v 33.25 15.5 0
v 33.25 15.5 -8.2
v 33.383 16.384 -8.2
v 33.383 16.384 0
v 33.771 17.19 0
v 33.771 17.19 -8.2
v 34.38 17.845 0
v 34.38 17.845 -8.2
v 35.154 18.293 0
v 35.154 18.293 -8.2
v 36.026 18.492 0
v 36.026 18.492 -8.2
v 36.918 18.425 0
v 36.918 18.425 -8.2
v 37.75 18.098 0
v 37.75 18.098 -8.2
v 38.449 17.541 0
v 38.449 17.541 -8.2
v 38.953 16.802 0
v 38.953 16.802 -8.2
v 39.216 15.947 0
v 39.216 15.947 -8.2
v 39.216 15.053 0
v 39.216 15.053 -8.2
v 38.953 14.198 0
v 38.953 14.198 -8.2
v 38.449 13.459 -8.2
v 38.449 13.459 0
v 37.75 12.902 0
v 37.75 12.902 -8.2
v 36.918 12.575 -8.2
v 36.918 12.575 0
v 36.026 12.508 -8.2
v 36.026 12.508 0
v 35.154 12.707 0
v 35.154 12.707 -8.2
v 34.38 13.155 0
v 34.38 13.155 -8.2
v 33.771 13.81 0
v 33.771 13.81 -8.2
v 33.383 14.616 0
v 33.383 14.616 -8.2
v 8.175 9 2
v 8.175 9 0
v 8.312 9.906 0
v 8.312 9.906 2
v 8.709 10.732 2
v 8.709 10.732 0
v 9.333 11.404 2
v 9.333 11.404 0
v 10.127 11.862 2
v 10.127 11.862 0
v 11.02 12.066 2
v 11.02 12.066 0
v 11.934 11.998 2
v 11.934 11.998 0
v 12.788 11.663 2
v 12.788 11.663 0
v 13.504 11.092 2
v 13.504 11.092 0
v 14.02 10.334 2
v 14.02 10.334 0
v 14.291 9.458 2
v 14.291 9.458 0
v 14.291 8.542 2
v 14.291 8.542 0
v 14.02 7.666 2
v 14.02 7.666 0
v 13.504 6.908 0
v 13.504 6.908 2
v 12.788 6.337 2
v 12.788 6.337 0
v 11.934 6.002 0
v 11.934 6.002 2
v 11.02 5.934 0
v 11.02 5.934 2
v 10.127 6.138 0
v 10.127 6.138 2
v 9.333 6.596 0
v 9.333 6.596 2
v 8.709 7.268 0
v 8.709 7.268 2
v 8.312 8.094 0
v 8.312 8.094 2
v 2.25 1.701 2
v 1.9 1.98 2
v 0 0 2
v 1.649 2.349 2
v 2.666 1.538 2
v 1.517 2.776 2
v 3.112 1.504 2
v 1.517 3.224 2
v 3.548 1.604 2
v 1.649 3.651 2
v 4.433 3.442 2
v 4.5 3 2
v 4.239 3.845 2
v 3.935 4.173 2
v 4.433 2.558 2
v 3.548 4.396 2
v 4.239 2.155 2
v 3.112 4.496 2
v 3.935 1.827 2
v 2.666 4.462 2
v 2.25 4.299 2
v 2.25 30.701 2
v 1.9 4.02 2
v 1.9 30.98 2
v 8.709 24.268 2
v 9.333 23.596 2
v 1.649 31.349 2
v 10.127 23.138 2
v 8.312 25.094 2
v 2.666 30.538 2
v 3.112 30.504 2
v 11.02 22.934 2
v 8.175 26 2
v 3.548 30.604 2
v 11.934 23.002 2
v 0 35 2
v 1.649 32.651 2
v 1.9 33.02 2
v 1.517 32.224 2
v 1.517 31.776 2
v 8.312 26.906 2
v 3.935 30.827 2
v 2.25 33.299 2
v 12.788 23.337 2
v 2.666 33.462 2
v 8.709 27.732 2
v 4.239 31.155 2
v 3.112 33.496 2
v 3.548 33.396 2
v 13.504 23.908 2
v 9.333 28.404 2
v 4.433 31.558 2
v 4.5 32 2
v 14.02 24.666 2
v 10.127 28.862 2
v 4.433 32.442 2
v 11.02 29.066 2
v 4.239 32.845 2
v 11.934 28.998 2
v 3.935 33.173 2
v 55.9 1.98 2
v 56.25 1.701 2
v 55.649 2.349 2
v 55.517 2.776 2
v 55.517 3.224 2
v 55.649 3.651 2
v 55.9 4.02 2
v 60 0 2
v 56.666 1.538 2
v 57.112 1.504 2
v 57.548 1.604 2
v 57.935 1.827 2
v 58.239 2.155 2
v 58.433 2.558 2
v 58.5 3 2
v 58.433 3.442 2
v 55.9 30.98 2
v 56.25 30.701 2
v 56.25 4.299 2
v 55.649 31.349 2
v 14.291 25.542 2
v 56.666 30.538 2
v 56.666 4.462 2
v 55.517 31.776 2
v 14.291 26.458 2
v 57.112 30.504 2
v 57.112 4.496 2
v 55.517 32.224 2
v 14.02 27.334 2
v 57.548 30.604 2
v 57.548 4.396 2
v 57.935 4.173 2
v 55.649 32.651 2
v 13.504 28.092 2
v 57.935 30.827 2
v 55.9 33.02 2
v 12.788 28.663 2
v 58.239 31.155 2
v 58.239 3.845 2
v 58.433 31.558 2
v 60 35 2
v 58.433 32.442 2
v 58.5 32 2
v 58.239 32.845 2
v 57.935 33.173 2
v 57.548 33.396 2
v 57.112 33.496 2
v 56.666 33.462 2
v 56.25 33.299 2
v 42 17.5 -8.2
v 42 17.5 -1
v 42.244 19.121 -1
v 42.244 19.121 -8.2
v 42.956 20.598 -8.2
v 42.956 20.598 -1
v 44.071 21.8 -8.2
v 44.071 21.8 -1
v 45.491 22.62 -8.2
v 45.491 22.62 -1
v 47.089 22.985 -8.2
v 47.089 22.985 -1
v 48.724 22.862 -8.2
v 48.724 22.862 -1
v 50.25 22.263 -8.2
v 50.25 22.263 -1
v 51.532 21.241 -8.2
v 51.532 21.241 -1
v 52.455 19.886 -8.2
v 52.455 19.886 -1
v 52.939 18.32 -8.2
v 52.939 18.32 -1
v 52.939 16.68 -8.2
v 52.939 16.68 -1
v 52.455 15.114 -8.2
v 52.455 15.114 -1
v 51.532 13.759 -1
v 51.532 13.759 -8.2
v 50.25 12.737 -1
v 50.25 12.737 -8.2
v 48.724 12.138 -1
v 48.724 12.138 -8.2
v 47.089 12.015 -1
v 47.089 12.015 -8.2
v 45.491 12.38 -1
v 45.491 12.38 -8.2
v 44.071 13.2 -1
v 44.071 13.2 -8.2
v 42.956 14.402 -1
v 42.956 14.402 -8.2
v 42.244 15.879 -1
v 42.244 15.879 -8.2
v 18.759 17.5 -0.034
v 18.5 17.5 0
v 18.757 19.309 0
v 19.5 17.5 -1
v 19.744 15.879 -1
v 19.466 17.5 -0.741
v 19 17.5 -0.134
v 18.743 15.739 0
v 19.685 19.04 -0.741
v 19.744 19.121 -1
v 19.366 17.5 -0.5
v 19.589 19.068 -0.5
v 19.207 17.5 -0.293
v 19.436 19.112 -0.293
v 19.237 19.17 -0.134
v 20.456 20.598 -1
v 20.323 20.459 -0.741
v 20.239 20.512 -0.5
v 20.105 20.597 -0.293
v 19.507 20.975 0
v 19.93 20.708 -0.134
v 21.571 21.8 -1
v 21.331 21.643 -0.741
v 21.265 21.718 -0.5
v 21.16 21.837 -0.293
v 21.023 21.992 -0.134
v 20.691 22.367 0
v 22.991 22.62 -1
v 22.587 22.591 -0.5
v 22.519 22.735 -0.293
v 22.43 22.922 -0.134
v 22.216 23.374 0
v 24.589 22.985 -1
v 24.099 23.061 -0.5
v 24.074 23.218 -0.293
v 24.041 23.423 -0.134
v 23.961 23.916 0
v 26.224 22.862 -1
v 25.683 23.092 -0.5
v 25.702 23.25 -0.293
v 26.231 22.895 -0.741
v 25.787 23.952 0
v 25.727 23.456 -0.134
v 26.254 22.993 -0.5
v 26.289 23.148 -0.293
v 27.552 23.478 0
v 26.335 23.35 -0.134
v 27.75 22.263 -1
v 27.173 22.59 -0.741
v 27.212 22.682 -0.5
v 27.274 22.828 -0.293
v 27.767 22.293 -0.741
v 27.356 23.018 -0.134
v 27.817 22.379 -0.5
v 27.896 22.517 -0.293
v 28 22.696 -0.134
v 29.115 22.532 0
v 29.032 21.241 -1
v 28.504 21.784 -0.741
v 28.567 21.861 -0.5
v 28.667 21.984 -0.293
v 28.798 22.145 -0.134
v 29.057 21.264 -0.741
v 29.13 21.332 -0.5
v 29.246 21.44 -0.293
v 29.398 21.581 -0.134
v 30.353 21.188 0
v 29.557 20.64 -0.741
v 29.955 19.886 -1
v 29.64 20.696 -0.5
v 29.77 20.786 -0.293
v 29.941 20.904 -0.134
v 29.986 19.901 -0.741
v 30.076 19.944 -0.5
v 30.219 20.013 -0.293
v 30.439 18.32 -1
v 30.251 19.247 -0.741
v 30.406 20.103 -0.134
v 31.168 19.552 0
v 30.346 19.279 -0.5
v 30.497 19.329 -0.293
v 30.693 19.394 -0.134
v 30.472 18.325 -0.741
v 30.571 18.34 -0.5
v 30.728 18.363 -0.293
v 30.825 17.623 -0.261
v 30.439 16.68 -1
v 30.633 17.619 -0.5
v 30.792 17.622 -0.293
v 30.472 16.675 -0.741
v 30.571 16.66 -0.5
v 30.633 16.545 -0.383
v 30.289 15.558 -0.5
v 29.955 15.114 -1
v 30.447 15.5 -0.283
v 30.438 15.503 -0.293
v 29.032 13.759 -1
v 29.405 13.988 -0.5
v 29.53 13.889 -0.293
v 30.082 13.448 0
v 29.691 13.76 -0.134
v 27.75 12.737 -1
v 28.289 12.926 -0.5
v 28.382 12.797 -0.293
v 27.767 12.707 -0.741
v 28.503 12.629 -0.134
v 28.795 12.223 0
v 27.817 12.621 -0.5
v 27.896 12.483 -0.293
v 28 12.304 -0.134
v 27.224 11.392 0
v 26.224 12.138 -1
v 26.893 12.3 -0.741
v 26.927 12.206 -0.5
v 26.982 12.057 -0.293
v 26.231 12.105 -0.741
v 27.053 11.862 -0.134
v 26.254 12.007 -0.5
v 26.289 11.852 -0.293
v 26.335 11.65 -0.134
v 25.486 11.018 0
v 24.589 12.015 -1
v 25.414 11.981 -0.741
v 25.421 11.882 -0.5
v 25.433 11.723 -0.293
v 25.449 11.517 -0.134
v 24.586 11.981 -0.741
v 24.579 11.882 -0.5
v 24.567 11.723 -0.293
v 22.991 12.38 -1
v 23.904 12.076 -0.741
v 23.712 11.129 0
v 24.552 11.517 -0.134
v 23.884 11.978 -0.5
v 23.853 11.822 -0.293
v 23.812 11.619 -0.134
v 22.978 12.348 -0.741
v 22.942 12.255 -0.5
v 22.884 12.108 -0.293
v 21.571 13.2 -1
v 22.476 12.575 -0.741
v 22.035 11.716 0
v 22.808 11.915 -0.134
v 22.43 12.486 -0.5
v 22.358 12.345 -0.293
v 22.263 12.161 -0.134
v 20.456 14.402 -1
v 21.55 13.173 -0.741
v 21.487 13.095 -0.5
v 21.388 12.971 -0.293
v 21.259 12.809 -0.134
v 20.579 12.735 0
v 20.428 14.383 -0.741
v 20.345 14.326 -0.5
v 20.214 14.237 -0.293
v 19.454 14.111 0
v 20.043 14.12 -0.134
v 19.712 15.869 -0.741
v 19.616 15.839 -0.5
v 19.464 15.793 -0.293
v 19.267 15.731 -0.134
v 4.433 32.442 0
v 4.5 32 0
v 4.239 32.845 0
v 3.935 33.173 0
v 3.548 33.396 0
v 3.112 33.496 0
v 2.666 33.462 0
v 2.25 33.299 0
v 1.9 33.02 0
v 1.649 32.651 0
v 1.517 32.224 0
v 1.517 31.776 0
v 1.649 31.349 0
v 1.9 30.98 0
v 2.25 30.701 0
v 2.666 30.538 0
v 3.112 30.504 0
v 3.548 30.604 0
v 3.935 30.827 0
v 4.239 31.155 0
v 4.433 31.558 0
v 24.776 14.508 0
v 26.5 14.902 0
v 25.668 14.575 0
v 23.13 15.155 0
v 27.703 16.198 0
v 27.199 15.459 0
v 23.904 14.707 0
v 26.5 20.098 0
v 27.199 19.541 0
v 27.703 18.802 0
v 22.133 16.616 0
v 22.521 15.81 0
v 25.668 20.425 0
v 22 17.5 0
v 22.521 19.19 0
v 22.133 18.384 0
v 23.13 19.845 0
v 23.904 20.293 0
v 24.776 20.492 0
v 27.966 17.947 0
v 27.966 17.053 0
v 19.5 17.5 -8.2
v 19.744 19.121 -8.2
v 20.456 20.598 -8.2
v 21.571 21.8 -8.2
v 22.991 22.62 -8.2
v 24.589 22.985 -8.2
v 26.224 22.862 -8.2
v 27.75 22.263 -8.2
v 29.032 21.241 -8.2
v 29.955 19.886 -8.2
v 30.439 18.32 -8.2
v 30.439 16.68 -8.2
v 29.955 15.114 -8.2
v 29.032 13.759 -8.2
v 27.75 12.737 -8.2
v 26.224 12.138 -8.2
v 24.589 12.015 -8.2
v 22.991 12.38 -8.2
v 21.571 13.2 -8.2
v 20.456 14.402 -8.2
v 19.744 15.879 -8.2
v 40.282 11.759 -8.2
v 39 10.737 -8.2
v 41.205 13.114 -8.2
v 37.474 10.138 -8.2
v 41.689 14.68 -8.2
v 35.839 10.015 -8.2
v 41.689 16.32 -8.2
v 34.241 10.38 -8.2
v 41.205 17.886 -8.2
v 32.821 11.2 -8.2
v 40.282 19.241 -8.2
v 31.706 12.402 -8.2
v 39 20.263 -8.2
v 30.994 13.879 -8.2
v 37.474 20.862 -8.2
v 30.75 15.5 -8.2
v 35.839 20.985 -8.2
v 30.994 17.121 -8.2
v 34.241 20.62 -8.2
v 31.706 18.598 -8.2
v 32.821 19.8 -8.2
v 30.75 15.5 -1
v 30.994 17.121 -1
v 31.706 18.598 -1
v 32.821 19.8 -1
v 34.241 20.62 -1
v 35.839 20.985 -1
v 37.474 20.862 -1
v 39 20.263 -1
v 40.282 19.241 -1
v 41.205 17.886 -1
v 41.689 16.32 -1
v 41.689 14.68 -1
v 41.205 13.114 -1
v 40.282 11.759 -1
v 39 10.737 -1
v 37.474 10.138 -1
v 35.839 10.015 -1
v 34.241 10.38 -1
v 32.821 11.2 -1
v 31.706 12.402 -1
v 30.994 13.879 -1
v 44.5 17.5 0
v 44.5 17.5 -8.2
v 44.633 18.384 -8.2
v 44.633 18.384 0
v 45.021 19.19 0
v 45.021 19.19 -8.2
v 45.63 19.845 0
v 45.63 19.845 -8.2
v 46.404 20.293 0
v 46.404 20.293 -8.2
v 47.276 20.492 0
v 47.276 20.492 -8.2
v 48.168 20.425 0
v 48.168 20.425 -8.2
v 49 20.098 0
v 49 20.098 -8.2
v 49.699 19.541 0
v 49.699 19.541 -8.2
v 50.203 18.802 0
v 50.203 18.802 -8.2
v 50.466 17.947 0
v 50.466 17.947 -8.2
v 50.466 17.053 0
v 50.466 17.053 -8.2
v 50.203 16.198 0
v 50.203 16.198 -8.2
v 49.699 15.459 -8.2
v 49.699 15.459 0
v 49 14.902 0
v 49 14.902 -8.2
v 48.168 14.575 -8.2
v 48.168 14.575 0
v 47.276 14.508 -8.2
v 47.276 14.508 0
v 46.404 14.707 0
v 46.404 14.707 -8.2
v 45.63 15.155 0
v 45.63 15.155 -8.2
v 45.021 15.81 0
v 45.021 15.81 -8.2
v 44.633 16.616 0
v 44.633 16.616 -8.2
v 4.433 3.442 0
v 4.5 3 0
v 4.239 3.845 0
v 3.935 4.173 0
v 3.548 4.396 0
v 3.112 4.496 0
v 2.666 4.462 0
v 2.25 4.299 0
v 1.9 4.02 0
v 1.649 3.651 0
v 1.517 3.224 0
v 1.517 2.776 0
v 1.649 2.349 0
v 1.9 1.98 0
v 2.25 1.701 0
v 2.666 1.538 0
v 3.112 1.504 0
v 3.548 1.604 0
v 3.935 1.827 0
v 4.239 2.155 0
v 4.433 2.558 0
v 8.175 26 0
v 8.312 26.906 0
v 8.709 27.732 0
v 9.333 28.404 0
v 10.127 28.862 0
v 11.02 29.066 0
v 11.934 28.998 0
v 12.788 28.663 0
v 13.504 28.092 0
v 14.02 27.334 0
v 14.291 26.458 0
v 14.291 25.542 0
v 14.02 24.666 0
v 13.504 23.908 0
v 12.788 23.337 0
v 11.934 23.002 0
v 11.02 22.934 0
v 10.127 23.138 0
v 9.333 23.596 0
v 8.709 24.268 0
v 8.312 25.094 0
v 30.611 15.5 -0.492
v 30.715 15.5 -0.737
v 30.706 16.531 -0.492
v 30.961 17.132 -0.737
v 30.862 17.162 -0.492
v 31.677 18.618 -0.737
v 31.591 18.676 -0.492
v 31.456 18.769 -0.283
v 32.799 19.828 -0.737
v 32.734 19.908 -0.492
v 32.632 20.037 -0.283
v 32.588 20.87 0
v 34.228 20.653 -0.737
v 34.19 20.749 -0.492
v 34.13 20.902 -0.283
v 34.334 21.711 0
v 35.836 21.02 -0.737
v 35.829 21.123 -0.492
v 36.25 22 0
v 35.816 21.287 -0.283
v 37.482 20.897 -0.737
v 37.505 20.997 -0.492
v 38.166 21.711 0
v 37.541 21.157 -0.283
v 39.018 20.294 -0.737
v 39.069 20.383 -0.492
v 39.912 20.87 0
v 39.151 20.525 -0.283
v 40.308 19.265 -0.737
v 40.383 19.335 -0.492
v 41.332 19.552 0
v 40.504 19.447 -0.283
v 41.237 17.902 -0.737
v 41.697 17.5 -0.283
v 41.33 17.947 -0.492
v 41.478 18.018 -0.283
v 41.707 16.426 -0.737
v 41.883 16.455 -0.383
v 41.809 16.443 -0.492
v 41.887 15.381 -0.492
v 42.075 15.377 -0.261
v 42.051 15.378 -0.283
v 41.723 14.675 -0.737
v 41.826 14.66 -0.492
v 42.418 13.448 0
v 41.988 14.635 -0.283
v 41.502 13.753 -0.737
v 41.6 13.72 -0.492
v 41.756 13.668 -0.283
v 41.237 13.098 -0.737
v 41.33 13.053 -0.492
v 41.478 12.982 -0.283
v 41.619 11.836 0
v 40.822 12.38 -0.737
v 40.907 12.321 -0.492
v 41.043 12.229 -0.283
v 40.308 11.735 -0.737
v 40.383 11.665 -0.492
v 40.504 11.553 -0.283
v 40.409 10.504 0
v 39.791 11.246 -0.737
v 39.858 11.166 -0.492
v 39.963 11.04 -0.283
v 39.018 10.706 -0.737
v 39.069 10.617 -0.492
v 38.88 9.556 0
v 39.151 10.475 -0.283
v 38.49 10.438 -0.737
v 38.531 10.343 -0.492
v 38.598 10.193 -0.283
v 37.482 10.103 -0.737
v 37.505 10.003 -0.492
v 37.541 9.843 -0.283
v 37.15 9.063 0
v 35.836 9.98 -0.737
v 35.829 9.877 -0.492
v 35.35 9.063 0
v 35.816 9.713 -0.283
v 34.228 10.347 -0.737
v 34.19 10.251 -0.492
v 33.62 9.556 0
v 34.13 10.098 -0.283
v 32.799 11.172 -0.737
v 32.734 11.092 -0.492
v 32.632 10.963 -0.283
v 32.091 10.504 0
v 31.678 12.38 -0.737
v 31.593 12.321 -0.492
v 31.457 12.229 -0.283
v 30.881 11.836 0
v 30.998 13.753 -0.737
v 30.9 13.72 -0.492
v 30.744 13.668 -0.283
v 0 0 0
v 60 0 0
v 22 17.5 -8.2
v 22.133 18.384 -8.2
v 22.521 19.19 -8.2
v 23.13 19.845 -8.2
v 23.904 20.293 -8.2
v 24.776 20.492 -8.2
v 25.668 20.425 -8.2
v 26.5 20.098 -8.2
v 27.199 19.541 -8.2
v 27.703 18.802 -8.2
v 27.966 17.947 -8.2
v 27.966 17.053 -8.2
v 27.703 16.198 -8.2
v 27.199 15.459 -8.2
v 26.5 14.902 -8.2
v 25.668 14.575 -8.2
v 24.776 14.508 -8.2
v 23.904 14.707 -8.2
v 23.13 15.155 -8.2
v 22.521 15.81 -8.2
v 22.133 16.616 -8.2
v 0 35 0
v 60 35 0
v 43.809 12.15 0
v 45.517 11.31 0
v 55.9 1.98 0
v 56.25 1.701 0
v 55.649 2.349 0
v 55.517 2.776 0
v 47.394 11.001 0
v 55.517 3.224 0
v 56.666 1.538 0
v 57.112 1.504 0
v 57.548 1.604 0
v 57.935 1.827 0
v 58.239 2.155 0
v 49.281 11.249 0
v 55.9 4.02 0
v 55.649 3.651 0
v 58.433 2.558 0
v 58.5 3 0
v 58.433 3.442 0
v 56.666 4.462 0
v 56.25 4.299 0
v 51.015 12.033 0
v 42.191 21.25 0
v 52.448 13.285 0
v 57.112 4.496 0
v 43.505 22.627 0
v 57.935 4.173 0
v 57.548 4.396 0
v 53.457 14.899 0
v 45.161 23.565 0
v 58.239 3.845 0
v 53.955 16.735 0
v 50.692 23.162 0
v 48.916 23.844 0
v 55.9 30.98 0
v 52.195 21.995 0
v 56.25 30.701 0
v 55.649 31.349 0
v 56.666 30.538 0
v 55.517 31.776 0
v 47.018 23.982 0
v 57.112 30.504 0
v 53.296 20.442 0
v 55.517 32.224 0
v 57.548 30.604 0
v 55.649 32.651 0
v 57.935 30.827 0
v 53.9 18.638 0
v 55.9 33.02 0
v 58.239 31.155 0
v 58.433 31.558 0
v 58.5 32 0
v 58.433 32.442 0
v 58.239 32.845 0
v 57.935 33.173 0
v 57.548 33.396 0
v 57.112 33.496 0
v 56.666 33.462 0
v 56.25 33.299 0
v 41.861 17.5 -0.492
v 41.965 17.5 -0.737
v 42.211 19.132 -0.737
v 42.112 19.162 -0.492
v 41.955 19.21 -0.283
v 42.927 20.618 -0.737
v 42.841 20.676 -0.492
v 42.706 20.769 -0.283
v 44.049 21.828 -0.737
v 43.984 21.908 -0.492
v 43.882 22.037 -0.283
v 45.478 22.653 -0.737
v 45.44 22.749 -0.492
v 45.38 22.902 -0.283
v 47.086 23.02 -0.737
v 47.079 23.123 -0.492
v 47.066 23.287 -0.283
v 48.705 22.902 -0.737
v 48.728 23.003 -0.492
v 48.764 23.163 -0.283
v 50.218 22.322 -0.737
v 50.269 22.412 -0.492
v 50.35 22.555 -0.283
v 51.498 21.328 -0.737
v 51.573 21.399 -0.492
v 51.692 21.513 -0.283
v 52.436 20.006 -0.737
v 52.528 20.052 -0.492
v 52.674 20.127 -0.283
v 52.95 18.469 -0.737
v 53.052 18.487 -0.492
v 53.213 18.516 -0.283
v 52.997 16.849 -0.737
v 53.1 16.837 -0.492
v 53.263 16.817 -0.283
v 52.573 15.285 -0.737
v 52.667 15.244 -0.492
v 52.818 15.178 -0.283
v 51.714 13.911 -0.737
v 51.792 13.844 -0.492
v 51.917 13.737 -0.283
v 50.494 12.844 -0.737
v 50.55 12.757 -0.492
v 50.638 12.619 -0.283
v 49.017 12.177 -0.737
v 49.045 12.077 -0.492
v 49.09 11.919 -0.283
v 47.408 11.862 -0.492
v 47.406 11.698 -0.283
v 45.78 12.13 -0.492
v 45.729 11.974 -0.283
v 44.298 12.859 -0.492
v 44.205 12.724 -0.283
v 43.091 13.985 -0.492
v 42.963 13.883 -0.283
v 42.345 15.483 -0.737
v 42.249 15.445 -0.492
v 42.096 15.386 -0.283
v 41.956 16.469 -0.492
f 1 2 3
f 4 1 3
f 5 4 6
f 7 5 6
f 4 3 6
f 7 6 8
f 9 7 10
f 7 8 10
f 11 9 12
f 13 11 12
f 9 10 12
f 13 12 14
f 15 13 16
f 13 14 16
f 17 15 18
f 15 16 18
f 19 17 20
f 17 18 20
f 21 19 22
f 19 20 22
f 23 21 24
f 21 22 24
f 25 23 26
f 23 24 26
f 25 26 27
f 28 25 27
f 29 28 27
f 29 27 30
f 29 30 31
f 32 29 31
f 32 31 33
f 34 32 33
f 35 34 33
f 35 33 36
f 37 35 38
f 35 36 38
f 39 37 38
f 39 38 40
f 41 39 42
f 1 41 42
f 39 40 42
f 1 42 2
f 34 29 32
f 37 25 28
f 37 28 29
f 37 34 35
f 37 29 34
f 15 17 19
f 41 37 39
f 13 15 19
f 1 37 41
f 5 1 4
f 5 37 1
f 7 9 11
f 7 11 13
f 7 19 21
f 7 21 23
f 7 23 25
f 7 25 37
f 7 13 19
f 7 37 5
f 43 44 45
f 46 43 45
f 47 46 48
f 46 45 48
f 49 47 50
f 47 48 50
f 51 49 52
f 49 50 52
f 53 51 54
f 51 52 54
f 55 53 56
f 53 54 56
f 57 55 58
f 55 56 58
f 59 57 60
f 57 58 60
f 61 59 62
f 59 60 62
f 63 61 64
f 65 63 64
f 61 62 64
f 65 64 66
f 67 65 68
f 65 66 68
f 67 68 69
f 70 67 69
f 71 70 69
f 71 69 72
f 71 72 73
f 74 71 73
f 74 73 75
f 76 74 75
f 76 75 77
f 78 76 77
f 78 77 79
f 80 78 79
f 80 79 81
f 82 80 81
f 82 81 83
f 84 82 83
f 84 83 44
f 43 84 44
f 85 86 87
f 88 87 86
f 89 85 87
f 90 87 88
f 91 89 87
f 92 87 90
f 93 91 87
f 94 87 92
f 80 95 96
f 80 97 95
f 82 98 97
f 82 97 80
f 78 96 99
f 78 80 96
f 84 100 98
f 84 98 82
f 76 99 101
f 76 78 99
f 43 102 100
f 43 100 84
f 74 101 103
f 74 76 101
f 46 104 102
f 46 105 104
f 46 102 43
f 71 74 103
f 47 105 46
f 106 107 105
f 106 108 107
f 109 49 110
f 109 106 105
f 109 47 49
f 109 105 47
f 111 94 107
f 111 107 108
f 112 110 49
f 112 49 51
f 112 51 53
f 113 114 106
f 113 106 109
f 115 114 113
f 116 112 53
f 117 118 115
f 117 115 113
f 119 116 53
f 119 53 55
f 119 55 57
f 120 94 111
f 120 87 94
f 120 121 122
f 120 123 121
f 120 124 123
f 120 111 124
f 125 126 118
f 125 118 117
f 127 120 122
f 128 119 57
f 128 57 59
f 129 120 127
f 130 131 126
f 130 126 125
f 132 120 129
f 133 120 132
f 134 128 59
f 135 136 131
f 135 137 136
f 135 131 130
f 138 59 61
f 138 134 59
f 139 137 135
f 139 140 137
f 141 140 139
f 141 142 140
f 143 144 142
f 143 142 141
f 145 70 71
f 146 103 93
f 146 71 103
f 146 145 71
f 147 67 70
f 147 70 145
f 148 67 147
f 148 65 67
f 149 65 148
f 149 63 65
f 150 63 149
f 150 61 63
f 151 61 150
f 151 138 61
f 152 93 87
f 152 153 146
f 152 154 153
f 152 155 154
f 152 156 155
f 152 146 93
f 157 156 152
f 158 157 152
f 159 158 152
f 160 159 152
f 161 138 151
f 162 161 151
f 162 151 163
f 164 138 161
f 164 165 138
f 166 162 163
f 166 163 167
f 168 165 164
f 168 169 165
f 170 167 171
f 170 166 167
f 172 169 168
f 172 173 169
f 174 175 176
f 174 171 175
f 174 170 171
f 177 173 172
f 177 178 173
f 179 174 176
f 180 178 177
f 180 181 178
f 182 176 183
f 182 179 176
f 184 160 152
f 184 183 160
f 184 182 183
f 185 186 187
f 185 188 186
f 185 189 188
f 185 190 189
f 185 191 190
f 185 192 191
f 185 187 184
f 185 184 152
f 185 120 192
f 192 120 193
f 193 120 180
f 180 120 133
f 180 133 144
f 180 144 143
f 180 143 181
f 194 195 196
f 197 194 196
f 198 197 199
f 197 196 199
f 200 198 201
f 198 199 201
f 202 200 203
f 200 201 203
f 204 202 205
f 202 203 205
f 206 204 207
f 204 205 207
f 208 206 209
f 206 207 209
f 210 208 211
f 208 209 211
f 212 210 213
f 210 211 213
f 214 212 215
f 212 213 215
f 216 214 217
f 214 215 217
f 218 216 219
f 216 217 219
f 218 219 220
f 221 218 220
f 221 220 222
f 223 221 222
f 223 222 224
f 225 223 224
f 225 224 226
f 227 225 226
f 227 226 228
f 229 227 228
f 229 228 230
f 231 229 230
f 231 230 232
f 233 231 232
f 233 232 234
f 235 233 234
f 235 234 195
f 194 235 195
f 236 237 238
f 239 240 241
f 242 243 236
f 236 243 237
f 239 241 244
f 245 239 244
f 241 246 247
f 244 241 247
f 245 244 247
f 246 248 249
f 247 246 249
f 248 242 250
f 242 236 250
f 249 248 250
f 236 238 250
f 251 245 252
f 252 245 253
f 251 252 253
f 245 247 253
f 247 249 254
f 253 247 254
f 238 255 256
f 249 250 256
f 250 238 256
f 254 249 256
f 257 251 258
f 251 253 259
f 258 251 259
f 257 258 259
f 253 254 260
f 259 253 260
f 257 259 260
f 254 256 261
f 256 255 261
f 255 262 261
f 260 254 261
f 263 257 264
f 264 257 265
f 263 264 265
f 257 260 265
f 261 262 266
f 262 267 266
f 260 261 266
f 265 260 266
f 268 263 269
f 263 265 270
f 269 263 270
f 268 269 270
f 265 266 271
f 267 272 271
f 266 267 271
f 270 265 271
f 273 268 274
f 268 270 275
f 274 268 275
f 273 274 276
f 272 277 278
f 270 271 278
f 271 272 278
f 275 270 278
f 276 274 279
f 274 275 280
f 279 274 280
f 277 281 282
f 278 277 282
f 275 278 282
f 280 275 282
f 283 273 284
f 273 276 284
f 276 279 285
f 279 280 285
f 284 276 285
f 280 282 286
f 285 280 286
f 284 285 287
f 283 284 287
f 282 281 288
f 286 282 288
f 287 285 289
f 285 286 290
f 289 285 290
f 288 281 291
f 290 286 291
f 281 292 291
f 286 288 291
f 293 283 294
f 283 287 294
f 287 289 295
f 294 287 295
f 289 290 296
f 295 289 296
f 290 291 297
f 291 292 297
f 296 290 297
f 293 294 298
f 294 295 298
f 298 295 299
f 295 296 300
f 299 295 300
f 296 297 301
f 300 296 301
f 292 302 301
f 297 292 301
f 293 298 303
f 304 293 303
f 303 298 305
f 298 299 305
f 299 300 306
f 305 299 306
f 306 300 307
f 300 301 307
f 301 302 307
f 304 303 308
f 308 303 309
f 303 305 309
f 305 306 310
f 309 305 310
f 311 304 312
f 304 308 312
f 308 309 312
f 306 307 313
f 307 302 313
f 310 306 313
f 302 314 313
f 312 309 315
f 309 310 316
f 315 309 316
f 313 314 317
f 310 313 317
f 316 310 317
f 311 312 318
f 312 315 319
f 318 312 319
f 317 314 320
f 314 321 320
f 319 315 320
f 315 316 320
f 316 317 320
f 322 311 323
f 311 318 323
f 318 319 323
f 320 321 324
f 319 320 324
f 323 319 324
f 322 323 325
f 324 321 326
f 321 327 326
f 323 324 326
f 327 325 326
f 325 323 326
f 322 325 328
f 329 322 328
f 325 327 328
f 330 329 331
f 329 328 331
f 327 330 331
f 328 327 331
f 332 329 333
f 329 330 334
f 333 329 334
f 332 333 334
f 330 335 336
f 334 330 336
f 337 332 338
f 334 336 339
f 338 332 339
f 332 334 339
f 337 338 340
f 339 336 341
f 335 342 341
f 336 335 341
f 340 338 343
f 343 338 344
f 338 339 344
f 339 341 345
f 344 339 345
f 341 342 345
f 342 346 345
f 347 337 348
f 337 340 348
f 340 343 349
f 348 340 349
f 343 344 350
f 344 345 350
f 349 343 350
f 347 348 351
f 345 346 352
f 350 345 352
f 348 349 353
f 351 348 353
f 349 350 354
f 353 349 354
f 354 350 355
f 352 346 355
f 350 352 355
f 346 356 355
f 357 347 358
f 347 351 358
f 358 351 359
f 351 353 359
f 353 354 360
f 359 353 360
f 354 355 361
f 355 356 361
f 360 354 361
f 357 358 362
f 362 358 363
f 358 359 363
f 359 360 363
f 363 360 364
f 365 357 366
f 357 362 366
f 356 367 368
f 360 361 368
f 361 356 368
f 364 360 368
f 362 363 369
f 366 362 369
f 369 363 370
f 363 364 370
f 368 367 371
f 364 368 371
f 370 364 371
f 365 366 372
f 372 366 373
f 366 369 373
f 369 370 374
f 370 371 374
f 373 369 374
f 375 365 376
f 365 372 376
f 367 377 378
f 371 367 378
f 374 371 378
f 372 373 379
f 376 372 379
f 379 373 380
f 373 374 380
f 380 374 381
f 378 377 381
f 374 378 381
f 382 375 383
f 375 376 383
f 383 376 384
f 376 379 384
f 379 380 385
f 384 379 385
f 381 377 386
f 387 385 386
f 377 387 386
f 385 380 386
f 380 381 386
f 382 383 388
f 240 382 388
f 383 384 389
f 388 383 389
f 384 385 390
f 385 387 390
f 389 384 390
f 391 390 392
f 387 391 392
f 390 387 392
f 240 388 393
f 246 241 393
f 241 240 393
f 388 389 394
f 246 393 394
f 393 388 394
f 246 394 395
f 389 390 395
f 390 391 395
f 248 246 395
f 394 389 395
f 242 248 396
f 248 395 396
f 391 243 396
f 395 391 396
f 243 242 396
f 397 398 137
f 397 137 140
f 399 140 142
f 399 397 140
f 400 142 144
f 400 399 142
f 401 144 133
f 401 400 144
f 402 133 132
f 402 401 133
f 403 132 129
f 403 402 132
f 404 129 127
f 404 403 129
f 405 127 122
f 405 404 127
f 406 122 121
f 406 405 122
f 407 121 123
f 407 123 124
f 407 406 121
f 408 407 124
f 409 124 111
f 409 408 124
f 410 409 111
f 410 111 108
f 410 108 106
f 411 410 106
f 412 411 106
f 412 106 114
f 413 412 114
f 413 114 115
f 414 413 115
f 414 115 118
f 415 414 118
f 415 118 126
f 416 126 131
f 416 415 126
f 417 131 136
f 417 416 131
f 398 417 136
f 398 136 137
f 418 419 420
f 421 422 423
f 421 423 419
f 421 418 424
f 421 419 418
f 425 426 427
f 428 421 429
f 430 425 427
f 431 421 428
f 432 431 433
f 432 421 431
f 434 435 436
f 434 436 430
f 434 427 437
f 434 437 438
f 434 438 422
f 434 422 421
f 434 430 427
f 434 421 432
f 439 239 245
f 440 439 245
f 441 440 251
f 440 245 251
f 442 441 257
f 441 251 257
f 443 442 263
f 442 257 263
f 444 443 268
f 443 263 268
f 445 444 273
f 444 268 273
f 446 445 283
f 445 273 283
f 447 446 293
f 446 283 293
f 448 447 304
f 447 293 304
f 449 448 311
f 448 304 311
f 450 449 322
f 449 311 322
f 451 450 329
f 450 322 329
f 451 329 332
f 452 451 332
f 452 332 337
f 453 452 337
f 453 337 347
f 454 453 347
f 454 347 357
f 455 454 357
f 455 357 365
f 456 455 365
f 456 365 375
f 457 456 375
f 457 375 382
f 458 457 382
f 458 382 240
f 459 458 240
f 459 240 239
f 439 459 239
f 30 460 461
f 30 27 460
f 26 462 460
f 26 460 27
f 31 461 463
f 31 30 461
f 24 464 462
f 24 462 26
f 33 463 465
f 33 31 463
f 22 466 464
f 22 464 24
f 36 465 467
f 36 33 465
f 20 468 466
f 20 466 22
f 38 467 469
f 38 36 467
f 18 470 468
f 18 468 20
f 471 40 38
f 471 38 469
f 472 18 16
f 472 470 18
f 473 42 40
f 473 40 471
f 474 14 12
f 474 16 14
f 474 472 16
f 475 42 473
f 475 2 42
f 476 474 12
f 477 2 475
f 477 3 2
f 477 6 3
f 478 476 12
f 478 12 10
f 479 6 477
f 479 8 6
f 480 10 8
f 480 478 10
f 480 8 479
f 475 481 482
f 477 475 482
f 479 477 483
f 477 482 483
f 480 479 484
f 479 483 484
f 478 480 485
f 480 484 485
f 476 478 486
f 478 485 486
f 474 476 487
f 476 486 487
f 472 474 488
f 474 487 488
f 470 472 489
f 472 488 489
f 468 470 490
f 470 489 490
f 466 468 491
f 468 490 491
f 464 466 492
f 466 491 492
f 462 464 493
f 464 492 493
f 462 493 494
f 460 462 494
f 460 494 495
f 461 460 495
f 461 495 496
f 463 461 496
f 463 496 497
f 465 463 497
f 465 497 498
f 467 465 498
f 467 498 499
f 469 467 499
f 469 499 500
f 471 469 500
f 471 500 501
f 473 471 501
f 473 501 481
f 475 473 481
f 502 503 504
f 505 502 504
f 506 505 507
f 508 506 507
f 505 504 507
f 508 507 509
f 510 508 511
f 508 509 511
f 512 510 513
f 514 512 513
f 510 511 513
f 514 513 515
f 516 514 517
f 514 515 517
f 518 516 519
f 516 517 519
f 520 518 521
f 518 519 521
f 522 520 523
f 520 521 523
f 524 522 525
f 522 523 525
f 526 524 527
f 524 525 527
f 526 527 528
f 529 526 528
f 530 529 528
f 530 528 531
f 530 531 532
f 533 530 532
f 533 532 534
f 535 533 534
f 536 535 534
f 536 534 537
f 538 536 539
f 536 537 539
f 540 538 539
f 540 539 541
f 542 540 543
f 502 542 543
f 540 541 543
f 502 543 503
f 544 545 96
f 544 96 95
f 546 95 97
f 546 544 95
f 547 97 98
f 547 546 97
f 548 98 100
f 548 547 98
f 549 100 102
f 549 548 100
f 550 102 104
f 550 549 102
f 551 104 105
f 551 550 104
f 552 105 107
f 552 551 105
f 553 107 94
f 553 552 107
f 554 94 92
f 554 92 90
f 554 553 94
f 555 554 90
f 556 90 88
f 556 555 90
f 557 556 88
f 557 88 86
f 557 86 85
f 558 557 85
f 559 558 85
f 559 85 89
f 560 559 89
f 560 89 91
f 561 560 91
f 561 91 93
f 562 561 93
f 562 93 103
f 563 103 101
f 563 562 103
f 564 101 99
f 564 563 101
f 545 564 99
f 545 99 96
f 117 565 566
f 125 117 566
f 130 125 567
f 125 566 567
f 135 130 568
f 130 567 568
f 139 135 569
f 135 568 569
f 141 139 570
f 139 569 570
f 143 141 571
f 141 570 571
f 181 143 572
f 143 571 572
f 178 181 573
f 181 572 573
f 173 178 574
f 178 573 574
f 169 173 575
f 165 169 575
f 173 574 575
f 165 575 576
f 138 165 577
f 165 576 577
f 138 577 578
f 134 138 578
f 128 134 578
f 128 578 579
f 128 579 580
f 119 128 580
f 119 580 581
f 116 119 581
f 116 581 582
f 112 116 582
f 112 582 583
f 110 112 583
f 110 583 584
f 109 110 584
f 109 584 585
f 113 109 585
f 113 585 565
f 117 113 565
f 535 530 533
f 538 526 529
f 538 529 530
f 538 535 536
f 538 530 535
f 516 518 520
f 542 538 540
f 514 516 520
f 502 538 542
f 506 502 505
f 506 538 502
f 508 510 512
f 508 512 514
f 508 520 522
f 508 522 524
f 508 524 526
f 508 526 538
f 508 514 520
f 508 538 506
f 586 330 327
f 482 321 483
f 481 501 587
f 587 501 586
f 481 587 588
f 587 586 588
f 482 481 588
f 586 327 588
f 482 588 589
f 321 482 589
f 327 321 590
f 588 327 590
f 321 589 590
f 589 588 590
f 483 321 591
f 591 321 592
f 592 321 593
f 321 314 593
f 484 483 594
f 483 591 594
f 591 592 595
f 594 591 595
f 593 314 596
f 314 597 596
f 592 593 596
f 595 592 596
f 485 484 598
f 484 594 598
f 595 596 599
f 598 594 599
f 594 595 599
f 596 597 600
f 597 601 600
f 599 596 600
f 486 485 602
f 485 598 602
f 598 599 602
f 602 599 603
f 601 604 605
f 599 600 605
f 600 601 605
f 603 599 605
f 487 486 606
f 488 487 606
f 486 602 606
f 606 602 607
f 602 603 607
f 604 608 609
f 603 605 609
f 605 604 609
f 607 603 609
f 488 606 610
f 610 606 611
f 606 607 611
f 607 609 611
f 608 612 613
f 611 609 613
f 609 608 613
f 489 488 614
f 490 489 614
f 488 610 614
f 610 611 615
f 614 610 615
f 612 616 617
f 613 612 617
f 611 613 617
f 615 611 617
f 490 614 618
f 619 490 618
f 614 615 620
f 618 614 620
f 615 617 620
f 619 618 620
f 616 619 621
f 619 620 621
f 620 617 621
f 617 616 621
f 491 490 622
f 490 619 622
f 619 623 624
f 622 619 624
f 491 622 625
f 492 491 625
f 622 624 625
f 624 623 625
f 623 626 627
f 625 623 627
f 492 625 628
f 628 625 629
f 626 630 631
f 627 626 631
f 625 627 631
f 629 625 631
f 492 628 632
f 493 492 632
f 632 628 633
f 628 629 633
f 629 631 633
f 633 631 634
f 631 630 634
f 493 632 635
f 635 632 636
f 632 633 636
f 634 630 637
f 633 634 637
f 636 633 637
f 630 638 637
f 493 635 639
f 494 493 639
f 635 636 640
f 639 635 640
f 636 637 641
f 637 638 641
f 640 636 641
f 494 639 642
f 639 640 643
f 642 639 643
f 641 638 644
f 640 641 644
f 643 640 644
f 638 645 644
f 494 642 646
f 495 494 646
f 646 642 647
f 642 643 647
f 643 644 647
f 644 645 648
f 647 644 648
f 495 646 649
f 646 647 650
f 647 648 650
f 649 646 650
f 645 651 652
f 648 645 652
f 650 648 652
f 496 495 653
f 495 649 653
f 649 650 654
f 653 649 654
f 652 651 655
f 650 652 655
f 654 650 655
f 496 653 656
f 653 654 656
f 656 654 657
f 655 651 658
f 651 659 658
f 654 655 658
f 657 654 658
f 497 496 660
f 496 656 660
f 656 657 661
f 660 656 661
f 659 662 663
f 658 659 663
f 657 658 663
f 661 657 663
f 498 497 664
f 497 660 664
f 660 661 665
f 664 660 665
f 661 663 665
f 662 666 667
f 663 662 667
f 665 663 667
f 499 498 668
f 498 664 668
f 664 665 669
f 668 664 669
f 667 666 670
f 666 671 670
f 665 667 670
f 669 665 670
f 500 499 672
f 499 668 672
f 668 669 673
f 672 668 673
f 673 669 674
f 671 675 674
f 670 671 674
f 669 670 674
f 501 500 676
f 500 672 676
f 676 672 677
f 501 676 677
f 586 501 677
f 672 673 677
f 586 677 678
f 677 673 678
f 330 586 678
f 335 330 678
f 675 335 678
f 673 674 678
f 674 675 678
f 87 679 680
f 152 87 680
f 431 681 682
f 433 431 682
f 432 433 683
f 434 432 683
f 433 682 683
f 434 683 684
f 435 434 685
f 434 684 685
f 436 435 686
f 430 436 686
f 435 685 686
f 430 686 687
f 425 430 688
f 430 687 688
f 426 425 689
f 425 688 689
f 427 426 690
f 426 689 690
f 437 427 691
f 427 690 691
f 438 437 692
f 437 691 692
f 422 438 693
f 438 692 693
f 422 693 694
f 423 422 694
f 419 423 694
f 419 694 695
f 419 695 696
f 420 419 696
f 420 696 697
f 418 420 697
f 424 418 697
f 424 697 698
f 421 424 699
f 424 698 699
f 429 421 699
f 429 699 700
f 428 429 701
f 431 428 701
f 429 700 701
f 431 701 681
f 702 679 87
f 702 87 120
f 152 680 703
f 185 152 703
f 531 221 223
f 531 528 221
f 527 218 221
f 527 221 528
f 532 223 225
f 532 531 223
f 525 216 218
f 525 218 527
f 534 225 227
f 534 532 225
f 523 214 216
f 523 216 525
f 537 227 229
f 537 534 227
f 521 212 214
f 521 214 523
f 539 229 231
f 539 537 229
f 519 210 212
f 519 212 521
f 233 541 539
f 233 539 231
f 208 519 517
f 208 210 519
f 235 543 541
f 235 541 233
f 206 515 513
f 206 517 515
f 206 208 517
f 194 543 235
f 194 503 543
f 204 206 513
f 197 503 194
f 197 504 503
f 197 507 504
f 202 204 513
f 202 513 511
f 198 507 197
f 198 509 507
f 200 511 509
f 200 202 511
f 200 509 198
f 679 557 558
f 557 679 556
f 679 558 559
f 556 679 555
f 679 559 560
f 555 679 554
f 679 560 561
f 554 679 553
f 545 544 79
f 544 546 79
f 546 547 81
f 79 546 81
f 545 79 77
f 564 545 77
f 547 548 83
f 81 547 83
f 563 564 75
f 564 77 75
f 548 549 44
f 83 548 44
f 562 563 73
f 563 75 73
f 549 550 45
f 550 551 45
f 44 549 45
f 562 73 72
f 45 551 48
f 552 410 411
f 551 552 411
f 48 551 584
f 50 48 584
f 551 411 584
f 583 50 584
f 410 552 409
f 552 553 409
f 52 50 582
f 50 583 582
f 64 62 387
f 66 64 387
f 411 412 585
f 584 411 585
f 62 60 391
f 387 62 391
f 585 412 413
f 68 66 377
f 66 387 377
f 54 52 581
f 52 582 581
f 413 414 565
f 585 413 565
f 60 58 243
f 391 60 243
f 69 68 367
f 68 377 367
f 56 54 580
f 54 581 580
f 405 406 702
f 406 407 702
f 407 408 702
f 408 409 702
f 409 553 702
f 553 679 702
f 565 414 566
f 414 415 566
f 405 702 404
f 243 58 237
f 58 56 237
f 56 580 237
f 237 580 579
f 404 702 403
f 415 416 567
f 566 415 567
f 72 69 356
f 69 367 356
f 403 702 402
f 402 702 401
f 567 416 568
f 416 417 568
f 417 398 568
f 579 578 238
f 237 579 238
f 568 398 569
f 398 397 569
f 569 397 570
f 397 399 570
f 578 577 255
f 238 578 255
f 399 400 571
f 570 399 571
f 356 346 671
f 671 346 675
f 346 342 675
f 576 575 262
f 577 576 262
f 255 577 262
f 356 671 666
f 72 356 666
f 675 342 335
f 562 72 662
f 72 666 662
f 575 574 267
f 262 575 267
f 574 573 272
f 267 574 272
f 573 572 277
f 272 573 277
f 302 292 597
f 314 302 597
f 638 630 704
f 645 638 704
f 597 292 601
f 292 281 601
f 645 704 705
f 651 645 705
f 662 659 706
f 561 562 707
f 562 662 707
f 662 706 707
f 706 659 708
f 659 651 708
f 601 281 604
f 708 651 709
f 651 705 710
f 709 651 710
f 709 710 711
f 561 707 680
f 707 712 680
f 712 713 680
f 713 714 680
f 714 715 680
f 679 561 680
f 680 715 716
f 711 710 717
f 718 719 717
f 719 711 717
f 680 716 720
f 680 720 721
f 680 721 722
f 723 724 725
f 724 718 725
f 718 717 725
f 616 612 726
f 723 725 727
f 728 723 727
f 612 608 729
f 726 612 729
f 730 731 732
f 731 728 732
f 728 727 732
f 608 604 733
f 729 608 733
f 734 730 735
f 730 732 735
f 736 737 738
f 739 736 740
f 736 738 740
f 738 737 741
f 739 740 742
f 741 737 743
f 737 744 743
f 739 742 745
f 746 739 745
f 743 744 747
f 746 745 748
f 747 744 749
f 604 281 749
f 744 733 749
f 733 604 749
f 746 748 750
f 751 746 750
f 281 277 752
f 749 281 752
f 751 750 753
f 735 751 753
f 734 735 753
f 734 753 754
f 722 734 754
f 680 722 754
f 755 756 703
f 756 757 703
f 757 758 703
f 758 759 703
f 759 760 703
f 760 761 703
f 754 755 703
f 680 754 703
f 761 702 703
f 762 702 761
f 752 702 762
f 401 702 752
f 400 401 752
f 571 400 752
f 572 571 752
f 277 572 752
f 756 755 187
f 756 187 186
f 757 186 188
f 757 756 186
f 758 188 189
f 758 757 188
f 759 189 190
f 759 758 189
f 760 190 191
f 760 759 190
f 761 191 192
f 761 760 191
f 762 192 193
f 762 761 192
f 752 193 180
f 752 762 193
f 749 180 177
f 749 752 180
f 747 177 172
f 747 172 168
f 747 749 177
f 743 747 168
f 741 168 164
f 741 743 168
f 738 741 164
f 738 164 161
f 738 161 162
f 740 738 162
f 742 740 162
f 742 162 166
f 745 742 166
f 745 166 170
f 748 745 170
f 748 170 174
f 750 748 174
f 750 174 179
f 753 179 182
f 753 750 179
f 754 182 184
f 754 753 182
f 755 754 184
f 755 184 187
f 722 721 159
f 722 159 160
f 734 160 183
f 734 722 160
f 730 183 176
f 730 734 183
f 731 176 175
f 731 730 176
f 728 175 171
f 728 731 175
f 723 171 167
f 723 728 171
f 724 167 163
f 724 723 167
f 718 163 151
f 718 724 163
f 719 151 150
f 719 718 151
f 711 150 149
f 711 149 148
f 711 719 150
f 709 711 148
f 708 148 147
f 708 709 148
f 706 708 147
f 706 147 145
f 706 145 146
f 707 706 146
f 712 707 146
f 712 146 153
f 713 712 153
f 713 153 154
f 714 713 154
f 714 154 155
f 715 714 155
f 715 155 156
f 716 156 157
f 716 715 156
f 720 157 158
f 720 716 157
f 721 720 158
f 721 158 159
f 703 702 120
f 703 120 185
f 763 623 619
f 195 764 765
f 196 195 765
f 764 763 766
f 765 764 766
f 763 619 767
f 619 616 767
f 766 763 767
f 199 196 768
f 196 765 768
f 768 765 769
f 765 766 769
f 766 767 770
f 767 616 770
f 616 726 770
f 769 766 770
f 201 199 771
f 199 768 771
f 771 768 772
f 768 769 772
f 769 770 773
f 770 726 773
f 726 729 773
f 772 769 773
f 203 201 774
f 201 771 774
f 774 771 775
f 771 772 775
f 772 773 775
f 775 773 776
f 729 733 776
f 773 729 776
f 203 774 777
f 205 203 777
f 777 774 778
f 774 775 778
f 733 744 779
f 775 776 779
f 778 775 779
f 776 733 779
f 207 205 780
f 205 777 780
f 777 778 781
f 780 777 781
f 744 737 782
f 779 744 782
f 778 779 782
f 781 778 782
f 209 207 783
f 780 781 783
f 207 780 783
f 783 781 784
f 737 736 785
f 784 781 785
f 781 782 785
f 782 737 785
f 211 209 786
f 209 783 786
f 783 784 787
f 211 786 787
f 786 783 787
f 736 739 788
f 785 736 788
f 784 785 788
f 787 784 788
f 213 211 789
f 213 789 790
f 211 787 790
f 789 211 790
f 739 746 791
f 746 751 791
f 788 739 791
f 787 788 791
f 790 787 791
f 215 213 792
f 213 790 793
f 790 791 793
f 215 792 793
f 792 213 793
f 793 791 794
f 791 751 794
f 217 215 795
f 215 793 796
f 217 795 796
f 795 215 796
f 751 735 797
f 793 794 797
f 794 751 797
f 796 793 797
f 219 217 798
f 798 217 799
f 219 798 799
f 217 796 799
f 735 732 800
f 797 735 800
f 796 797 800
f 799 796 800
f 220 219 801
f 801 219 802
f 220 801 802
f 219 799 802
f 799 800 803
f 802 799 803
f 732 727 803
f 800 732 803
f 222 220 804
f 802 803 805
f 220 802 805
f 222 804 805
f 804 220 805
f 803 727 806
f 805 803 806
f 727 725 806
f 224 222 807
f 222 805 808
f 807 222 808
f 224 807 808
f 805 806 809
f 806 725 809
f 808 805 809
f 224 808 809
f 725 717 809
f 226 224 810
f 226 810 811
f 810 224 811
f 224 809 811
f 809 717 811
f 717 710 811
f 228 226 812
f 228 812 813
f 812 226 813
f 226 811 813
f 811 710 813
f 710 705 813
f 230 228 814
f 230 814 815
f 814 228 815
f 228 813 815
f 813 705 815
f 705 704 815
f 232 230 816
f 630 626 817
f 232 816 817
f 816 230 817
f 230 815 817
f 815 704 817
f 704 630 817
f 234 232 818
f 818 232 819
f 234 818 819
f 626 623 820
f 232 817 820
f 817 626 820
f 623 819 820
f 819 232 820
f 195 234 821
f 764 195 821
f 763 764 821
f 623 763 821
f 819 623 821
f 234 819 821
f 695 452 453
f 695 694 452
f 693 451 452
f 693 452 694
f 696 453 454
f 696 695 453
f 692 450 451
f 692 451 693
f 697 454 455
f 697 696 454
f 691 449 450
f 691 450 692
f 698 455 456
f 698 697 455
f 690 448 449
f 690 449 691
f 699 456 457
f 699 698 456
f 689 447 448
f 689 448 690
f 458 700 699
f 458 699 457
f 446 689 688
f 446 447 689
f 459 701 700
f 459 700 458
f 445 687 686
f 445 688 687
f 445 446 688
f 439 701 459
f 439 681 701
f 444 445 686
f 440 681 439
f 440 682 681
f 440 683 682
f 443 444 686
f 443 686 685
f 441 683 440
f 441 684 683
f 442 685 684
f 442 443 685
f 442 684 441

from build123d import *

# Parameters (mm, degrees)
SKETCH1_W           = 60
SKETCH1_H           = 35
SKETCH1_R           = 1.5
BOSS_EXTRUDE1_DEPTH = 2
SKETCH2_R           = 5.5
BOSS_EXTRUDE2_DEPTH = 8.2
SKETCH5_R           = 3
CUT_EXTRUDE2_DEPTH  = 8.2
SKETCH6_R           = 3.075
CUT_EXTRUDE3_DEPTH  = 8.2
FILLET4_R           = 1


with BuildPart() as part:
    # Sketch1 → Boss-Extrude1 (new body)
    with BuildSketch(Plane.XY):
        with Locations((30, 17.5)):
            Rectangle(SKETCH1_W, SKETCH1_H)
        with Locations((57, 32)):
            Circle(SKETCH1_R, mode=Mode.SUBTRACT)
        with Locations((57, 3)):
            Circle(SKETCH1_R, mode=Mode.SUBTRACT)
        with Locations((3, 3)):
            Circle(SKETCH1_R, mode=Mode.SUBTRACT)
        with Locations((3, 32)):
            Circle(SKETCH1_R, mode=Mode.SUBTRACT)
    extrude(amount=BOSS_EXTRUDE1_DEPTH)

    # Sketch2 → Boss-Extrude2 (add)
    with BuildSketch(Plane(origin=(0, 0, 0), x_dir=(-1, 0, 0), z_dir=(0, 0, -1))):
        with Locations((-36.25, 15.5)):
            Circle(SKETCH2_R)
        with Locations((-25, 17.5)):
            Circle(SKETCH2_R)
        with Locations((-47.5, 17.5)):
            Circle(SKETCH2_R)
    extrude(amount=BOSS_EXTRUDE2_DEPTH)

    # Sketch5 → Cut-Extrude2 (cut)
    with BuildSketch(Plane(origin=(0, 0, -8.2), x_dir=(-1, 0, 0), z_dir=(0, 0, -1))):
        with Locations((-47.5, 17.5)):
            Circle(SKETCH5_R)
        with Locations((-36.25, 15.5)):
            Circle(SKETCH5_R)
        with Locations((-25, 17.5)):
            Circle(SKETCH5_R)
    extrude(amount=-CUT_EXTRUDE2_DEPTH, mode=Mode.SUBTRACT)

    # Sketch6 → Cut-Extrude3 (cut)
    with BuildSketch(Plane(origin=(0, 0, 0), x_dir=(-1, 0, 0), z_dir=(0, 0, -1))):
        with Locations((-11.25, 26)):
            Circle(SKETCH6_R)
        with Locations((-11.25, 9)):
            Circle(SKETCH6_R)
    extrude(amount=-CUT_EXTRUDE3_DEPTH, mode=Mode.SUBTRACT)

    # Fillet4
    # the kernel refuses this fillet: 1 mm, written as the material it adds along each edge
    with BuildSketch(Plane(origin=(36.25, 15.5, 0), x_dir=(-1, 0, 0), z_dir=(0, -1, 0))) as fillet4_piece_1:
        with BuildLine():
            CenterArc((5.5 + FILLET4_R, FILLET4_R), FILLET4_R, 180, 90)
            Line((5.5, FILLET4_R), (5.5, 0))
            Line((5.5, 0), (5.5 + FILLET4_R, 0))
        make_face()
    revolve(axis=Axis((36.25, 15.5, 0), (0, 0, -1)))
    with BuildSketch(Plane(origin=(25, 17.5, 0), x_dir=(-1, 0, 0), z_dir=(0, -1, 0))) as fillet4_piece_2:
        with BuildLine():
            CenterArc((5.5 + FILLET4_R, FILLET4_R), FILLET4_R, 180, 90)
            Line((5.5, FILLET4_R), (5.5, 0))
            Line((5.5, 0), (5.5 + FILLET4_R, 0))
        make_face()
    revolve(axis=Axis((25, 17.5, 0), (0, 0, -1)))
    with BuildSketch(Plane(origin=(47.5, 17.5, 0), x_dir=(-1, 0, 0), z_dir=(0, -1, 0))) as fillet4_piece_3:
        with BuildLine():
            CenterArc((5.5 + FILLET4_R, FILLET4_R), FILLET4_R, 180, 90)
            Line((5.5, FILLET4_R), (5.5, 0))
            Line((5.5, 0), (5.5 + FILLET4_R, 0))
        make_face()
    revolve(axis=Axis((47.5, 17.5, 0), (0, 0, -1)))


solid = part.part
